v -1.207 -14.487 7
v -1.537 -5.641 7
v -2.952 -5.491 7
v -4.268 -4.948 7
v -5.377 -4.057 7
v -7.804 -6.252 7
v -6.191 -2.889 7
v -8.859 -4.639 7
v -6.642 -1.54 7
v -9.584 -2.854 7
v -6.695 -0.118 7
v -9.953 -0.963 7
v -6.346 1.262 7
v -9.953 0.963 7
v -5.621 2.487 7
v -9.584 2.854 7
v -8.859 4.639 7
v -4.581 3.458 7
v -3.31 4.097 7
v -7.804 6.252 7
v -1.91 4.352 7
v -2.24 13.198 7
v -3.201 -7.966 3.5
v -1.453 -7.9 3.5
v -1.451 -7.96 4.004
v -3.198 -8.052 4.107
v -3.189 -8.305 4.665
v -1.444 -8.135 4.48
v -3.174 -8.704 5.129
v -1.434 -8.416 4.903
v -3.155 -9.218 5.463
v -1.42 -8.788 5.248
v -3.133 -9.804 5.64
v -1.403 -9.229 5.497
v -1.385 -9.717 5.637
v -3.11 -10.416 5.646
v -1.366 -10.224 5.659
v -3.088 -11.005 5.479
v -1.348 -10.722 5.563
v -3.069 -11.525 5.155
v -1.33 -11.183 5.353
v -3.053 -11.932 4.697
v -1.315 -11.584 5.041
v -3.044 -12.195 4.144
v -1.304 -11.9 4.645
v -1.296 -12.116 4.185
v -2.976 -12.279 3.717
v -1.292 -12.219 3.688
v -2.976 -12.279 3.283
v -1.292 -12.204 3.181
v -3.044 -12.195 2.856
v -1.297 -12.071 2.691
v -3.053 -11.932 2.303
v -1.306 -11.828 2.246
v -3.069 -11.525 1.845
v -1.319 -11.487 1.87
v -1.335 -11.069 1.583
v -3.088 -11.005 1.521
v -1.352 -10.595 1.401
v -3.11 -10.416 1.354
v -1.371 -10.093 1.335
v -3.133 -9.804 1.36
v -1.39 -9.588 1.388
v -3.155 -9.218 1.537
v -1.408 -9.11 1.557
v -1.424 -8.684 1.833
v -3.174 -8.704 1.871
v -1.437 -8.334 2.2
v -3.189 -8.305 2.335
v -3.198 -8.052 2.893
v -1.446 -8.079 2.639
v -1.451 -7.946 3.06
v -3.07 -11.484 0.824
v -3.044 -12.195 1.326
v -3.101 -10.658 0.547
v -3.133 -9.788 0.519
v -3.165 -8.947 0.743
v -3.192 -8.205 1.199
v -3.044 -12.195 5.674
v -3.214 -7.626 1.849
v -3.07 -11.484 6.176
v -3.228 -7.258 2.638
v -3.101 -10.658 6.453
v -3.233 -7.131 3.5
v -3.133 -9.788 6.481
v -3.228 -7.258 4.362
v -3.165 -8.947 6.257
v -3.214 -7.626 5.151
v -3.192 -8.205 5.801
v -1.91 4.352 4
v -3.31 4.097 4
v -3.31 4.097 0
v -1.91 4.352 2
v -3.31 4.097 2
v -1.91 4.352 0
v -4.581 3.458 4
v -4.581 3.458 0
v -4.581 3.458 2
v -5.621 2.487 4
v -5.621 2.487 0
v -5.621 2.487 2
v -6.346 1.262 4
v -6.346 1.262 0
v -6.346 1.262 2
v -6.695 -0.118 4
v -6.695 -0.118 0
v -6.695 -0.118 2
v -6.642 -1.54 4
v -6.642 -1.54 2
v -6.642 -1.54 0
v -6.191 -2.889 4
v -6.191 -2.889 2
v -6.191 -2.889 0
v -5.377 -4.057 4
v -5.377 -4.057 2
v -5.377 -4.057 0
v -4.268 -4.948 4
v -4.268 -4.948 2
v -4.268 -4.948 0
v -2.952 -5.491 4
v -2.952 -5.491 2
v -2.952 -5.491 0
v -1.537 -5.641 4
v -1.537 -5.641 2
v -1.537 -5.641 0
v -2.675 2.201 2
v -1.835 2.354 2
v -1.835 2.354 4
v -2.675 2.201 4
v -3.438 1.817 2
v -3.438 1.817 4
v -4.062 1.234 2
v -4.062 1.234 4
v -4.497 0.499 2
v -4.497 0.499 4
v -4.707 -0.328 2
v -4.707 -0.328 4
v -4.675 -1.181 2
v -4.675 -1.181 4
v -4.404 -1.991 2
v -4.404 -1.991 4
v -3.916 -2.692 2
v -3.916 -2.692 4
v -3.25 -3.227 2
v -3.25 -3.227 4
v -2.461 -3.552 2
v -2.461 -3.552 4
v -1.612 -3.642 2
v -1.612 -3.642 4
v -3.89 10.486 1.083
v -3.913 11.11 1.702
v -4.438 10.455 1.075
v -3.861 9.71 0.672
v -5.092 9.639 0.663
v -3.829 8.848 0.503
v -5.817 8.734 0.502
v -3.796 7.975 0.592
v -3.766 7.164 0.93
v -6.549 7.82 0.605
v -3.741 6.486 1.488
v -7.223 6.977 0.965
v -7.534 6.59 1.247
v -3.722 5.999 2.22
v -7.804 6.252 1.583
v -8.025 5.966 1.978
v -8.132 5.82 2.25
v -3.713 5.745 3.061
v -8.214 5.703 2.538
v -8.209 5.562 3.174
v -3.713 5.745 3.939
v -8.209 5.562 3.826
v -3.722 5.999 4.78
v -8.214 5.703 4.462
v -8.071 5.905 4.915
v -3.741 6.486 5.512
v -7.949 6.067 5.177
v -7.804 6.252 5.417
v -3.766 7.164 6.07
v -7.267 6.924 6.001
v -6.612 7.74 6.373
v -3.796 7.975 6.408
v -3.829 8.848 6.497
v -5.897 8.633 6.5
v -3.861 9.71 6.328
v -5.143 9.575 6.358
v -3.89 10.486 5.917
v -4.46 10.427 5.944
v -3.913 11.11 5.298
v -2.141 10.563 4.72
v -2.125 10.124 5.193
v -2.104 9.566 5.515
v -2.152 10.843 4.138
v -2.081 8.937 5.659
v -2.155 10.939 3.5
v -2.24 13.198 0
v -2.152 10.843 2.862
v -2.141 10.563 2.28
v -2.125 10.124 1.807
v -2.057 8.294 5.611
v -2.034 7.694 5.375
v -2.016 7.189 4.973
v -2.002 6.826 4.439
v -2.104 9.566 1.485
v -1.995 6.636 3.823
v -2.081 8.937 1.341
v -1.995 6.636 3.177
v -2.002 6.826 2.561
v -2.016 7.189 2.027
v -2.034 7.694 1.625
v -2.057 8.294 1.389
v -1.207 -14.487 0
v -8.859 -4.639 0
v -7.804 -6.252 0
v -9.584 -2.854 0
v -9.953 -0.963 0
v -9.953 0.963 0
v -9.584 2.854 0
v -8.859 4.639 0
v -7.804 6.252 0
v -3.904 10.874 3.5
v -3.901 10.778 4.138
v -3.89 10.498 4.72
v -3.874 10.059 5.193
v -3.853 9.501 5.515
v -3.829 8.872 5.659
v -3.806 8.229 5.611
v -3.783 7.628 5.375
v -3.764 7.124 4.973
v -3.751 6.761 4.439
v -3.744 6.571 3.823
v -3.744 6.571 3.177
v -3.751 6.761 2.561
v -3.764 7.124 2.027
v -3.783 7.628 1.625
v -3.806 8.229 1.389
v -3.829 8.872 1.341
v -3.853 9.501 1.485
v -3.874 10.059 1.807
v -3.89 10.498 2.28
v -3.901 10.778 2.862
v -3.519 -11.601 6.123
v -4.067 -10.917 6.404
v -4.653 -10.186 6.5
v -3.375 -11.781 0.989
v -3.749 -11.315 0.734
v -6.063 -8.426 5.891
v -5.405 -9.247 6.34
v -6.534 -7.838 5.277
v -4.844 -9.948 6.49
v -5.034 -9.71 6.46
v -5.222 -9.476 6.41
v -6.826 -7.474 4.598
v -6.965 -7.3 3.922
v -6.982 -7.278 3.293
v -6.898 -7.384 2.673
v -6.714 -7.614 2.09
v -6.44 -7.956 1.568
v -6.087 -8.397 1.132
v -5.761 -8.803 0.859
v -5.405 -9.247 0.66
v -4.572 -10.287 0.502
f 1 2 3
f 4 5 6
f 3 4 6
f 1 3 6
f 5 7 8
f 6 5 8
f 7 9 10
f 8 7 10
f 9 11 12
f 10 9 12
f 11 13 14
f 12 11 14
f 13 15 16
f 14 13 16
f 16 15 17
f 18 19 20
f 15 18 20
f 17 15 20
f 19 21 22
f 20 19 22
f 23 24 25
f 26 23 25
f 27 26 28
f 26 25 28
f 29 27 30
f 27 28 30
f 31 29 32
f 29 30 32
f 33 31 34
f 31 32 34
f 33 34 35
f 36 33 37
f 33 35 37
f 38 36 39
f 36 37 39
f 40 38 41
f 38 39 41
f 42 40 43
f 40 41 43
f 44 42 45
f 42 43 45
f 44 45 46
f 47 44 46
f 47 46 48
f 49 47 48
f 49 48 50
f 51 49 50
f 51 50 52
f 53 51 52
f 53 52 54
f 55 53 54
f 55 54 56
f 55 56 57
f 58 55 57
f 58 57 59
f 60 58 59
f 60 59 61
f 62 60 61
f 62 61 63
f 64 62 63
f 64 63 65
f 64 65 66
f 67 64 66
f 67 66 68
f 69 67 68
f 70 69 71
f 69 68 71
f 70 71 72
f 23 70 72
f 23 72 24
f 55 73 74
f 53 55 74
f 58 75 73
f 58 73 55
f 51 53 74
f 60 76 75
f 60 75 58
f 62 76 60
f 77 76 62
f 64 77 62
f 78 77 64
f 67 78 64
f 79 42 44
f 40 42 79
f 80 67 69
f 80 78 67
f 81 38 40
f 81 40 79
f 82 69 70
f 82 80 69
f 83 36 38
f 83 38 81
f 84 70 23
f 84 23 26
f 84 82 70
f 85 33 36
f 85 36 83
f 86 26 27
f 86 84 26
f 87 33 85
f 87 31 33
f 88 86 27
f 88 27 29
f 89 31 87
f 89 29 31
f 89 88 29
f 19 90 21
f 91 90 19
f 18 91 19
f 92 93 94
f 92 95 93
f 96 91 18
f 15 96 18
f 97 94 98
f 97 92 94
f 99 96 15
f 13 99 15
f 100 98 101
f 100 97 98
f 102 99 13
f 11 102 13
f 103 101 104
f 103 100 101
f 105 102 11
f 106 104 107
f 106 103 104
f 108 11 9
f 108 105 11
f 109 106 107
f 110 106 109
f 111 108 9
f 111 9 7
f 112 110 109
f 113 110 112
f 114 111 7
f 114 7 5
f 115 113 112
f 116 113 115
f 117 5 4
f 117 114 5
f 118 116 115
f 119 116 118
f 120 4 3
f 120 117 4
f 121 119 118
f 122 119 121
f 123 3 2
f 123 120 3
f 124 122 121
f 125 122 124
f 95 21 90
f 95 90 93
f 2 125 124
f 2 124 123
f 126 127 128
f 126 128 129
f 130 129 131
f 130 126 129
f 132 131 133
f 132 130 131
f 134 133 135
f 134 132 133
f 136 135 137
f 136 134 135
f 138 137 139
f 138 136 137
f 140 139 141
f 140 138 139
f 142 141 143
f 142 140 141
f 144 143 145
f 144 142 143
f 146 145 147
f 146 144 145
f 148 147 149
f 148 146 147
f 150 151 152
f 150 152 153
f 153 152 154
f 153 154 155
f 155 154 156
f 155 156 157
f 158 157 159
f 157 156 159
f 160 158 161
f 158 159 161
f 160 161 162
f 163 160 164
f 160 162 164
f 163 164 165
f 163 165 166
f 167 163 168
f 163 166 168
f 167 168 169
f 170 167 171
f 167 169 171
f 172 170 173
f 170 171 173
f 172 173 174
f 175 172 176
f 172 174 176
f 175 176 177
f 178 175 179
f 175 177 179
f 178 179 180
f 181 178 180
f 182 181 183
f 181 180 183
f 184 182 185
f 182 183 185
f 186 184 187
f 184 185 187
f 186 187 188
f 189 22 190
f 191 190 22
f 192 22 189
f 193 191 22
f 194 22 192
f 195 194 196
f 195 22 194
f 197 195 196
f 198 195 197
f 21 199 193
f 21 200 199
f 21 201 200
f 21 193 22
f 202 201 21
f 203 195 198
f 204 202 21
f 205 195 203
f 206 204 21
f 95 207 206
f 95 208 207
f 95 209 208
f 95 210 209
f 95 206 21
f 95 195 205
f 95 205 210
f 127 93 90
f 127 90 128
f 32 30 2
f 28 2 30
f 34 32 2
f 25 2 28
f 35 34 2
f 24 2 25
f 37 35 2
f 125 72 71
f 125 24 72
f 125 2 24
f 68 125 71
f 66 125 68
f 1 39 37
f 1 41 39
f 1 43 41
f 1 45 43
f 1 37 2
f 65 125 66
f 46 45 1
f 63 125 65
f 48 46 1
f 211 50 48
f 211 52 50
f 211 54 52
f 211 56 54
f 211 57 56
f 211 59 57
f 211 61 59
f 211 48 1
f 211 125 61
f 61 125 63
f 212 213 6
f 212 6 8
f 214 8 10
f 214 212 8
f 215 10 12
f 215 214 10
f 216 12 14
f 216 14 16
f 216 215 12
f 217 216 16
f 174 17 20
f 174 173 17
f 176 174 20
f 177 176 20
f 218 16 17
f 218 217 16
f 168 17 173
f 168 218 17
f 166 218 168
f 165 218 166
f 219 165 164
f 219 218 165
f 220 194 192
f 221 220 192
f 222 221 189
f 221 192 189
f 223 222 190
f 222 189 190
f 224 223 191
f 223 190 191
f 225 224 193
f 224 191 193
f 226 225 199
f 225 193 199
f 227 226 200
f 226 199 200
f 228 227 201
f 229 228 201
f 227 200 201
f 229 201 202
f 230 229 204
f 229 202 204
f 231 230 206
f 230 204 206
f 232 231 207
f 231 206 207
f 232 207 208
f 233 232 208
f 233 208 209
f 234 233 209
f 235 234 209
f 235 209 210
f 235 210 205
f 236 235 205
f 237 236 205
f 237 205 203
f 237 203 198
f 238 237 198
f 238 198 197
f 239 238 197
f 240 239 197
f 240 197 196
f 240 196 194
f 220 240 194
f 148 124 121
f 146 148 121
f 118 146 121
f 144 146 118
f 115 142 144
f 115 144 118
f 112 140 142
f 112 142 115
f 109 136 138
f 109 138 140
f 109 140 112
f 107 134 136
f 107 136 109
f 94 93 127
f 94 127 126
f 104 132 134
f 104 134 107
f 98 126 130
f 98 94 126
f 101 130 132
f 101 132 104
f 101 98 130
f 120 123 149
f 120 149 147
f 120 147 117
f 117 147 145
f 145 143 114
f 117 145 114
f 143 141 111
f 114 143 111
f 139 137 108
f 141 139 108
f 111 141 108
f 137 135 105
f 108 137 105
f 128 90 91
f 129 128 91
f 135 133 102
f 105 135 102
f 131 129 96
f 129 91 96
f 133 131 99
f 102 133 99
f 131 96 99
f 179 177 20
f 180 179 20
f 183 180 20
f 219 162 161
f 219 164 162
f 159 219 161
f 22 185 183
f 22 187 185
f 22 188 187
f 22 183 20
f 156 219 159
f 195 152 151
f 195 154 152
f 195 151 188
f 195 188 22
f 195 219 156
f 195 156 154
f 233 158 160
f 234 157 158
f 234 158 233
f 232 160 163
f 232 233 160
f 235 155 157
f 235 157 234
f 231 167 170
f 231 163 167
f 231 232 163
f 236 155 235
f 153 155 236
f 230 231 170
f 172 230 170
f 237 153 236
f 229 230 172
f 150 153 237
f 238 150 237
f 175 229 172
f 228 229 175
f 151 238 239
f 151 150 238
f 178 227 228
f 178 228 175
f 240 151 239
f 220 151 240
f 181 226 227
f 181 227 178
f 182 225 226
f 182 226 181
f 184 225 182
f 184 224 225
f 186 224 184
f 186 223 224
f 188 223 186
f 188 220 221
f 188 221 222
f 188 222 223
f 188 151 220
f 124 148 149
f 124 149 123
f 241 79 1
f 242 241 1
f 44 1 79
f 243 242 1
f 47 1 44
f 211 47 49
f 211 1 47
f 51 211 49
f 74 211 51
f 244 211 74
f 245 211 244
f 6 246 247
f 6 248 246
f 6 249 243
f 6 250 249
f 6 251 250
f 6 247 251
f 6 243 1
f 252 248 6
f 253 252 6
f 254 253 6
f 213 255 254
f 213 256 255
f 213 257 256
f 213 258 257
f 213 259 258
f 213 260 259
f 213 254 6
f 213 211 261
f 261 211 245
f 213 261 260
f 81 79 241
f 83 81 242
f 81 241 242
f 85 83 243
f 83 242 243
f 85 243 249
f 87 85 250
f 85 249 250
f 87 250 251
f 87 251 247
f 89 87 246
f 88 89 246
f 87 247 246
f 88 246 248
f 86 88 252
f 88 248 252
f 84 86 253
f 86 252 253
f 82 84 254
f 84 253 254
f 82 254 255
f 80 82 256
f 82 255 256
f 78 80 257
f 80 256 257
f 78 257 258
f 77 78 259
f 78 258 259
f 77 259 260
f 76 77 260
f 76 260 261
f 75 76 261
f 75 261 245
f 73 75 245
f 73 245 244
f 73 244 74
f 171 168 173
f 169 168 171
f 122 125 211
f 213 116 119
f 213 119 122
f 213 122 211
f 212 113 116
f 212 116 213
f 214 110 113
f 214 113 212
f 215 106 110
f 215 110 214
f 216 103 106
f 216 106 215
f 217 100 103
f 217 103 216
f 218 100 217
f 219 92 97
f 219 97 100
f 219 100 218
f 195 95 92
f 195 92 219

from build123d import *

# Parameters (mm, degrees)
BOSS_EXTRUDE2_DEPTH = 7
BOSS_EXTRUDE3_START = -2
BOSS_EXTRUDE3_DEPTH = 2
CUT_EXTRUDE1_REACH  = 20.032
SKETCH4_R           = 2.165
SKETCH6_R           = 3
CUT_EXTRUDE2_DEPTH  = 2.25


with BuildPart() as part:
    # Sketch2 → Boss-Extrude2 (new body)
    with BuildSketch(Plane.XY):
        with BuildLine():
            Line((-1.537034244, -5.640729849), (-1.207226003, -14.487186411))
            Line((-1.207226003, -14.487186411), (-7.804400539, -6.252306152))
            ThreePointArc((-7.804400539, -6.252306152), (-10, 0), (-7.804400539, 6.252306152))
            Line((-7.804400539, 6.252306152), (-2.239666493, 13.198449277))
            Line((-2.239666493, 13.198449277), (-1.909690796, 4.352324093))
            ThreePointArc((-1.909690796, 4.352324093), (-6.719838781, -0.830529263), (-1.537034244, -5.640729849))
        make_face()
    extrude(amount=BOSS_EXTRUDE2_DEPTH)

    # Sketch3 → Boss-Extrude3 (add)
    with BuildSketch(Plane.XY.offset(4).offset(BOSS_EXTRUDE3_START)):
        with BuildLine():
            Line((-1.909780577, 4.352320743), (-1.835249267, 2.353709953))
            ThreePointArc((-1.835249267, 2.353709953), (-4.721227993, -0.755997952), (-1.611655337, -3.642122406))
            Line((-1.611655337, -3.642122406), (-1.537124027, -5.640733196))
            ThreePointArc((-1.537124027, -5.640733196), (-6.719838781, -0.830529263), (-1.909780577, 4.352320743))
        make_face()
    extrude(amount=BOSS_EXTRUDE3_DEPTH)

    # Sketch4 → Cut-Extrude1 (cut, up to next)
    with BuildSketch(Plane(origin=(-1.744913711, -0.065088285, 0), x_dir=(0, 0, -1), z_dir=(0.9993050159682331, 0.03727579725142651, 0)), mode=Mode.PRIVATE) as cut_extrude1_sk1:
        with Locations(Location((-3.5, 8.846623232, 0), (0, 0, 90))):
            Circle(SKETCH4_R)
    cut_extrude1_tool1 = extrude(cut_extrude1_sk1.sketch, amount=-CUT_EXTRUDE1_REACH, mode=Mode.PRIVATE) & part.part
    # Sketch4 → Cut-Extrude1 (cut, up to next)
    with BuildSketch(Plane(origin=(-1.744913711, -0.065088285, 0), x_dir=(0, 0, -1), z_dir=(0.9993050159682331, 0.03727579725142651, 0)), mode=Mode.PRIVATE) as cut_extrude1_sk2:
        with Locations(Location((-3.5, -10.005816596, 0), (0, 0, 90))):
            Circle(SKETCH4_R)
    cut_extrude1_tool2 = extrude(cut_extrude1_sk2.sketch, amount=-CUT_EXTRUDE1_REACH, mode=Mode.PRIVATE) & part.part
    add(cut_extrude1_tool1.solids().sort_by_distance((-2.074679, 8.775387, 3.5))[0], mode=Mode.SUBTRACT)
    add(cut_extrude1_tool2.solids().sort_by_distance((-1.371939, -10.063951, 3.5))[0], mode=Mode.SUBTRACT)

    # Sketch6 → Cut-Extrude2 (cut, symmetric)
    with BuildSketch(Plane(origin=(-5.742133775, -0.214191474, 0), x_dir=(0, 0, 1), z_dir=(-0.9993050159682331, -0.03727579725142651, 0))):
        with Locations((3.5, -10.005816596)):
            Circle(SKETCH6_R)
        with Locations((3.5, 8.846623232)):
            Circle(SKETCH6_R)
    extrude(amount=CUT_EXTRUDE2_DEPTH, both=True, mode=Mode.SUBTRACT)


solid = part.part
